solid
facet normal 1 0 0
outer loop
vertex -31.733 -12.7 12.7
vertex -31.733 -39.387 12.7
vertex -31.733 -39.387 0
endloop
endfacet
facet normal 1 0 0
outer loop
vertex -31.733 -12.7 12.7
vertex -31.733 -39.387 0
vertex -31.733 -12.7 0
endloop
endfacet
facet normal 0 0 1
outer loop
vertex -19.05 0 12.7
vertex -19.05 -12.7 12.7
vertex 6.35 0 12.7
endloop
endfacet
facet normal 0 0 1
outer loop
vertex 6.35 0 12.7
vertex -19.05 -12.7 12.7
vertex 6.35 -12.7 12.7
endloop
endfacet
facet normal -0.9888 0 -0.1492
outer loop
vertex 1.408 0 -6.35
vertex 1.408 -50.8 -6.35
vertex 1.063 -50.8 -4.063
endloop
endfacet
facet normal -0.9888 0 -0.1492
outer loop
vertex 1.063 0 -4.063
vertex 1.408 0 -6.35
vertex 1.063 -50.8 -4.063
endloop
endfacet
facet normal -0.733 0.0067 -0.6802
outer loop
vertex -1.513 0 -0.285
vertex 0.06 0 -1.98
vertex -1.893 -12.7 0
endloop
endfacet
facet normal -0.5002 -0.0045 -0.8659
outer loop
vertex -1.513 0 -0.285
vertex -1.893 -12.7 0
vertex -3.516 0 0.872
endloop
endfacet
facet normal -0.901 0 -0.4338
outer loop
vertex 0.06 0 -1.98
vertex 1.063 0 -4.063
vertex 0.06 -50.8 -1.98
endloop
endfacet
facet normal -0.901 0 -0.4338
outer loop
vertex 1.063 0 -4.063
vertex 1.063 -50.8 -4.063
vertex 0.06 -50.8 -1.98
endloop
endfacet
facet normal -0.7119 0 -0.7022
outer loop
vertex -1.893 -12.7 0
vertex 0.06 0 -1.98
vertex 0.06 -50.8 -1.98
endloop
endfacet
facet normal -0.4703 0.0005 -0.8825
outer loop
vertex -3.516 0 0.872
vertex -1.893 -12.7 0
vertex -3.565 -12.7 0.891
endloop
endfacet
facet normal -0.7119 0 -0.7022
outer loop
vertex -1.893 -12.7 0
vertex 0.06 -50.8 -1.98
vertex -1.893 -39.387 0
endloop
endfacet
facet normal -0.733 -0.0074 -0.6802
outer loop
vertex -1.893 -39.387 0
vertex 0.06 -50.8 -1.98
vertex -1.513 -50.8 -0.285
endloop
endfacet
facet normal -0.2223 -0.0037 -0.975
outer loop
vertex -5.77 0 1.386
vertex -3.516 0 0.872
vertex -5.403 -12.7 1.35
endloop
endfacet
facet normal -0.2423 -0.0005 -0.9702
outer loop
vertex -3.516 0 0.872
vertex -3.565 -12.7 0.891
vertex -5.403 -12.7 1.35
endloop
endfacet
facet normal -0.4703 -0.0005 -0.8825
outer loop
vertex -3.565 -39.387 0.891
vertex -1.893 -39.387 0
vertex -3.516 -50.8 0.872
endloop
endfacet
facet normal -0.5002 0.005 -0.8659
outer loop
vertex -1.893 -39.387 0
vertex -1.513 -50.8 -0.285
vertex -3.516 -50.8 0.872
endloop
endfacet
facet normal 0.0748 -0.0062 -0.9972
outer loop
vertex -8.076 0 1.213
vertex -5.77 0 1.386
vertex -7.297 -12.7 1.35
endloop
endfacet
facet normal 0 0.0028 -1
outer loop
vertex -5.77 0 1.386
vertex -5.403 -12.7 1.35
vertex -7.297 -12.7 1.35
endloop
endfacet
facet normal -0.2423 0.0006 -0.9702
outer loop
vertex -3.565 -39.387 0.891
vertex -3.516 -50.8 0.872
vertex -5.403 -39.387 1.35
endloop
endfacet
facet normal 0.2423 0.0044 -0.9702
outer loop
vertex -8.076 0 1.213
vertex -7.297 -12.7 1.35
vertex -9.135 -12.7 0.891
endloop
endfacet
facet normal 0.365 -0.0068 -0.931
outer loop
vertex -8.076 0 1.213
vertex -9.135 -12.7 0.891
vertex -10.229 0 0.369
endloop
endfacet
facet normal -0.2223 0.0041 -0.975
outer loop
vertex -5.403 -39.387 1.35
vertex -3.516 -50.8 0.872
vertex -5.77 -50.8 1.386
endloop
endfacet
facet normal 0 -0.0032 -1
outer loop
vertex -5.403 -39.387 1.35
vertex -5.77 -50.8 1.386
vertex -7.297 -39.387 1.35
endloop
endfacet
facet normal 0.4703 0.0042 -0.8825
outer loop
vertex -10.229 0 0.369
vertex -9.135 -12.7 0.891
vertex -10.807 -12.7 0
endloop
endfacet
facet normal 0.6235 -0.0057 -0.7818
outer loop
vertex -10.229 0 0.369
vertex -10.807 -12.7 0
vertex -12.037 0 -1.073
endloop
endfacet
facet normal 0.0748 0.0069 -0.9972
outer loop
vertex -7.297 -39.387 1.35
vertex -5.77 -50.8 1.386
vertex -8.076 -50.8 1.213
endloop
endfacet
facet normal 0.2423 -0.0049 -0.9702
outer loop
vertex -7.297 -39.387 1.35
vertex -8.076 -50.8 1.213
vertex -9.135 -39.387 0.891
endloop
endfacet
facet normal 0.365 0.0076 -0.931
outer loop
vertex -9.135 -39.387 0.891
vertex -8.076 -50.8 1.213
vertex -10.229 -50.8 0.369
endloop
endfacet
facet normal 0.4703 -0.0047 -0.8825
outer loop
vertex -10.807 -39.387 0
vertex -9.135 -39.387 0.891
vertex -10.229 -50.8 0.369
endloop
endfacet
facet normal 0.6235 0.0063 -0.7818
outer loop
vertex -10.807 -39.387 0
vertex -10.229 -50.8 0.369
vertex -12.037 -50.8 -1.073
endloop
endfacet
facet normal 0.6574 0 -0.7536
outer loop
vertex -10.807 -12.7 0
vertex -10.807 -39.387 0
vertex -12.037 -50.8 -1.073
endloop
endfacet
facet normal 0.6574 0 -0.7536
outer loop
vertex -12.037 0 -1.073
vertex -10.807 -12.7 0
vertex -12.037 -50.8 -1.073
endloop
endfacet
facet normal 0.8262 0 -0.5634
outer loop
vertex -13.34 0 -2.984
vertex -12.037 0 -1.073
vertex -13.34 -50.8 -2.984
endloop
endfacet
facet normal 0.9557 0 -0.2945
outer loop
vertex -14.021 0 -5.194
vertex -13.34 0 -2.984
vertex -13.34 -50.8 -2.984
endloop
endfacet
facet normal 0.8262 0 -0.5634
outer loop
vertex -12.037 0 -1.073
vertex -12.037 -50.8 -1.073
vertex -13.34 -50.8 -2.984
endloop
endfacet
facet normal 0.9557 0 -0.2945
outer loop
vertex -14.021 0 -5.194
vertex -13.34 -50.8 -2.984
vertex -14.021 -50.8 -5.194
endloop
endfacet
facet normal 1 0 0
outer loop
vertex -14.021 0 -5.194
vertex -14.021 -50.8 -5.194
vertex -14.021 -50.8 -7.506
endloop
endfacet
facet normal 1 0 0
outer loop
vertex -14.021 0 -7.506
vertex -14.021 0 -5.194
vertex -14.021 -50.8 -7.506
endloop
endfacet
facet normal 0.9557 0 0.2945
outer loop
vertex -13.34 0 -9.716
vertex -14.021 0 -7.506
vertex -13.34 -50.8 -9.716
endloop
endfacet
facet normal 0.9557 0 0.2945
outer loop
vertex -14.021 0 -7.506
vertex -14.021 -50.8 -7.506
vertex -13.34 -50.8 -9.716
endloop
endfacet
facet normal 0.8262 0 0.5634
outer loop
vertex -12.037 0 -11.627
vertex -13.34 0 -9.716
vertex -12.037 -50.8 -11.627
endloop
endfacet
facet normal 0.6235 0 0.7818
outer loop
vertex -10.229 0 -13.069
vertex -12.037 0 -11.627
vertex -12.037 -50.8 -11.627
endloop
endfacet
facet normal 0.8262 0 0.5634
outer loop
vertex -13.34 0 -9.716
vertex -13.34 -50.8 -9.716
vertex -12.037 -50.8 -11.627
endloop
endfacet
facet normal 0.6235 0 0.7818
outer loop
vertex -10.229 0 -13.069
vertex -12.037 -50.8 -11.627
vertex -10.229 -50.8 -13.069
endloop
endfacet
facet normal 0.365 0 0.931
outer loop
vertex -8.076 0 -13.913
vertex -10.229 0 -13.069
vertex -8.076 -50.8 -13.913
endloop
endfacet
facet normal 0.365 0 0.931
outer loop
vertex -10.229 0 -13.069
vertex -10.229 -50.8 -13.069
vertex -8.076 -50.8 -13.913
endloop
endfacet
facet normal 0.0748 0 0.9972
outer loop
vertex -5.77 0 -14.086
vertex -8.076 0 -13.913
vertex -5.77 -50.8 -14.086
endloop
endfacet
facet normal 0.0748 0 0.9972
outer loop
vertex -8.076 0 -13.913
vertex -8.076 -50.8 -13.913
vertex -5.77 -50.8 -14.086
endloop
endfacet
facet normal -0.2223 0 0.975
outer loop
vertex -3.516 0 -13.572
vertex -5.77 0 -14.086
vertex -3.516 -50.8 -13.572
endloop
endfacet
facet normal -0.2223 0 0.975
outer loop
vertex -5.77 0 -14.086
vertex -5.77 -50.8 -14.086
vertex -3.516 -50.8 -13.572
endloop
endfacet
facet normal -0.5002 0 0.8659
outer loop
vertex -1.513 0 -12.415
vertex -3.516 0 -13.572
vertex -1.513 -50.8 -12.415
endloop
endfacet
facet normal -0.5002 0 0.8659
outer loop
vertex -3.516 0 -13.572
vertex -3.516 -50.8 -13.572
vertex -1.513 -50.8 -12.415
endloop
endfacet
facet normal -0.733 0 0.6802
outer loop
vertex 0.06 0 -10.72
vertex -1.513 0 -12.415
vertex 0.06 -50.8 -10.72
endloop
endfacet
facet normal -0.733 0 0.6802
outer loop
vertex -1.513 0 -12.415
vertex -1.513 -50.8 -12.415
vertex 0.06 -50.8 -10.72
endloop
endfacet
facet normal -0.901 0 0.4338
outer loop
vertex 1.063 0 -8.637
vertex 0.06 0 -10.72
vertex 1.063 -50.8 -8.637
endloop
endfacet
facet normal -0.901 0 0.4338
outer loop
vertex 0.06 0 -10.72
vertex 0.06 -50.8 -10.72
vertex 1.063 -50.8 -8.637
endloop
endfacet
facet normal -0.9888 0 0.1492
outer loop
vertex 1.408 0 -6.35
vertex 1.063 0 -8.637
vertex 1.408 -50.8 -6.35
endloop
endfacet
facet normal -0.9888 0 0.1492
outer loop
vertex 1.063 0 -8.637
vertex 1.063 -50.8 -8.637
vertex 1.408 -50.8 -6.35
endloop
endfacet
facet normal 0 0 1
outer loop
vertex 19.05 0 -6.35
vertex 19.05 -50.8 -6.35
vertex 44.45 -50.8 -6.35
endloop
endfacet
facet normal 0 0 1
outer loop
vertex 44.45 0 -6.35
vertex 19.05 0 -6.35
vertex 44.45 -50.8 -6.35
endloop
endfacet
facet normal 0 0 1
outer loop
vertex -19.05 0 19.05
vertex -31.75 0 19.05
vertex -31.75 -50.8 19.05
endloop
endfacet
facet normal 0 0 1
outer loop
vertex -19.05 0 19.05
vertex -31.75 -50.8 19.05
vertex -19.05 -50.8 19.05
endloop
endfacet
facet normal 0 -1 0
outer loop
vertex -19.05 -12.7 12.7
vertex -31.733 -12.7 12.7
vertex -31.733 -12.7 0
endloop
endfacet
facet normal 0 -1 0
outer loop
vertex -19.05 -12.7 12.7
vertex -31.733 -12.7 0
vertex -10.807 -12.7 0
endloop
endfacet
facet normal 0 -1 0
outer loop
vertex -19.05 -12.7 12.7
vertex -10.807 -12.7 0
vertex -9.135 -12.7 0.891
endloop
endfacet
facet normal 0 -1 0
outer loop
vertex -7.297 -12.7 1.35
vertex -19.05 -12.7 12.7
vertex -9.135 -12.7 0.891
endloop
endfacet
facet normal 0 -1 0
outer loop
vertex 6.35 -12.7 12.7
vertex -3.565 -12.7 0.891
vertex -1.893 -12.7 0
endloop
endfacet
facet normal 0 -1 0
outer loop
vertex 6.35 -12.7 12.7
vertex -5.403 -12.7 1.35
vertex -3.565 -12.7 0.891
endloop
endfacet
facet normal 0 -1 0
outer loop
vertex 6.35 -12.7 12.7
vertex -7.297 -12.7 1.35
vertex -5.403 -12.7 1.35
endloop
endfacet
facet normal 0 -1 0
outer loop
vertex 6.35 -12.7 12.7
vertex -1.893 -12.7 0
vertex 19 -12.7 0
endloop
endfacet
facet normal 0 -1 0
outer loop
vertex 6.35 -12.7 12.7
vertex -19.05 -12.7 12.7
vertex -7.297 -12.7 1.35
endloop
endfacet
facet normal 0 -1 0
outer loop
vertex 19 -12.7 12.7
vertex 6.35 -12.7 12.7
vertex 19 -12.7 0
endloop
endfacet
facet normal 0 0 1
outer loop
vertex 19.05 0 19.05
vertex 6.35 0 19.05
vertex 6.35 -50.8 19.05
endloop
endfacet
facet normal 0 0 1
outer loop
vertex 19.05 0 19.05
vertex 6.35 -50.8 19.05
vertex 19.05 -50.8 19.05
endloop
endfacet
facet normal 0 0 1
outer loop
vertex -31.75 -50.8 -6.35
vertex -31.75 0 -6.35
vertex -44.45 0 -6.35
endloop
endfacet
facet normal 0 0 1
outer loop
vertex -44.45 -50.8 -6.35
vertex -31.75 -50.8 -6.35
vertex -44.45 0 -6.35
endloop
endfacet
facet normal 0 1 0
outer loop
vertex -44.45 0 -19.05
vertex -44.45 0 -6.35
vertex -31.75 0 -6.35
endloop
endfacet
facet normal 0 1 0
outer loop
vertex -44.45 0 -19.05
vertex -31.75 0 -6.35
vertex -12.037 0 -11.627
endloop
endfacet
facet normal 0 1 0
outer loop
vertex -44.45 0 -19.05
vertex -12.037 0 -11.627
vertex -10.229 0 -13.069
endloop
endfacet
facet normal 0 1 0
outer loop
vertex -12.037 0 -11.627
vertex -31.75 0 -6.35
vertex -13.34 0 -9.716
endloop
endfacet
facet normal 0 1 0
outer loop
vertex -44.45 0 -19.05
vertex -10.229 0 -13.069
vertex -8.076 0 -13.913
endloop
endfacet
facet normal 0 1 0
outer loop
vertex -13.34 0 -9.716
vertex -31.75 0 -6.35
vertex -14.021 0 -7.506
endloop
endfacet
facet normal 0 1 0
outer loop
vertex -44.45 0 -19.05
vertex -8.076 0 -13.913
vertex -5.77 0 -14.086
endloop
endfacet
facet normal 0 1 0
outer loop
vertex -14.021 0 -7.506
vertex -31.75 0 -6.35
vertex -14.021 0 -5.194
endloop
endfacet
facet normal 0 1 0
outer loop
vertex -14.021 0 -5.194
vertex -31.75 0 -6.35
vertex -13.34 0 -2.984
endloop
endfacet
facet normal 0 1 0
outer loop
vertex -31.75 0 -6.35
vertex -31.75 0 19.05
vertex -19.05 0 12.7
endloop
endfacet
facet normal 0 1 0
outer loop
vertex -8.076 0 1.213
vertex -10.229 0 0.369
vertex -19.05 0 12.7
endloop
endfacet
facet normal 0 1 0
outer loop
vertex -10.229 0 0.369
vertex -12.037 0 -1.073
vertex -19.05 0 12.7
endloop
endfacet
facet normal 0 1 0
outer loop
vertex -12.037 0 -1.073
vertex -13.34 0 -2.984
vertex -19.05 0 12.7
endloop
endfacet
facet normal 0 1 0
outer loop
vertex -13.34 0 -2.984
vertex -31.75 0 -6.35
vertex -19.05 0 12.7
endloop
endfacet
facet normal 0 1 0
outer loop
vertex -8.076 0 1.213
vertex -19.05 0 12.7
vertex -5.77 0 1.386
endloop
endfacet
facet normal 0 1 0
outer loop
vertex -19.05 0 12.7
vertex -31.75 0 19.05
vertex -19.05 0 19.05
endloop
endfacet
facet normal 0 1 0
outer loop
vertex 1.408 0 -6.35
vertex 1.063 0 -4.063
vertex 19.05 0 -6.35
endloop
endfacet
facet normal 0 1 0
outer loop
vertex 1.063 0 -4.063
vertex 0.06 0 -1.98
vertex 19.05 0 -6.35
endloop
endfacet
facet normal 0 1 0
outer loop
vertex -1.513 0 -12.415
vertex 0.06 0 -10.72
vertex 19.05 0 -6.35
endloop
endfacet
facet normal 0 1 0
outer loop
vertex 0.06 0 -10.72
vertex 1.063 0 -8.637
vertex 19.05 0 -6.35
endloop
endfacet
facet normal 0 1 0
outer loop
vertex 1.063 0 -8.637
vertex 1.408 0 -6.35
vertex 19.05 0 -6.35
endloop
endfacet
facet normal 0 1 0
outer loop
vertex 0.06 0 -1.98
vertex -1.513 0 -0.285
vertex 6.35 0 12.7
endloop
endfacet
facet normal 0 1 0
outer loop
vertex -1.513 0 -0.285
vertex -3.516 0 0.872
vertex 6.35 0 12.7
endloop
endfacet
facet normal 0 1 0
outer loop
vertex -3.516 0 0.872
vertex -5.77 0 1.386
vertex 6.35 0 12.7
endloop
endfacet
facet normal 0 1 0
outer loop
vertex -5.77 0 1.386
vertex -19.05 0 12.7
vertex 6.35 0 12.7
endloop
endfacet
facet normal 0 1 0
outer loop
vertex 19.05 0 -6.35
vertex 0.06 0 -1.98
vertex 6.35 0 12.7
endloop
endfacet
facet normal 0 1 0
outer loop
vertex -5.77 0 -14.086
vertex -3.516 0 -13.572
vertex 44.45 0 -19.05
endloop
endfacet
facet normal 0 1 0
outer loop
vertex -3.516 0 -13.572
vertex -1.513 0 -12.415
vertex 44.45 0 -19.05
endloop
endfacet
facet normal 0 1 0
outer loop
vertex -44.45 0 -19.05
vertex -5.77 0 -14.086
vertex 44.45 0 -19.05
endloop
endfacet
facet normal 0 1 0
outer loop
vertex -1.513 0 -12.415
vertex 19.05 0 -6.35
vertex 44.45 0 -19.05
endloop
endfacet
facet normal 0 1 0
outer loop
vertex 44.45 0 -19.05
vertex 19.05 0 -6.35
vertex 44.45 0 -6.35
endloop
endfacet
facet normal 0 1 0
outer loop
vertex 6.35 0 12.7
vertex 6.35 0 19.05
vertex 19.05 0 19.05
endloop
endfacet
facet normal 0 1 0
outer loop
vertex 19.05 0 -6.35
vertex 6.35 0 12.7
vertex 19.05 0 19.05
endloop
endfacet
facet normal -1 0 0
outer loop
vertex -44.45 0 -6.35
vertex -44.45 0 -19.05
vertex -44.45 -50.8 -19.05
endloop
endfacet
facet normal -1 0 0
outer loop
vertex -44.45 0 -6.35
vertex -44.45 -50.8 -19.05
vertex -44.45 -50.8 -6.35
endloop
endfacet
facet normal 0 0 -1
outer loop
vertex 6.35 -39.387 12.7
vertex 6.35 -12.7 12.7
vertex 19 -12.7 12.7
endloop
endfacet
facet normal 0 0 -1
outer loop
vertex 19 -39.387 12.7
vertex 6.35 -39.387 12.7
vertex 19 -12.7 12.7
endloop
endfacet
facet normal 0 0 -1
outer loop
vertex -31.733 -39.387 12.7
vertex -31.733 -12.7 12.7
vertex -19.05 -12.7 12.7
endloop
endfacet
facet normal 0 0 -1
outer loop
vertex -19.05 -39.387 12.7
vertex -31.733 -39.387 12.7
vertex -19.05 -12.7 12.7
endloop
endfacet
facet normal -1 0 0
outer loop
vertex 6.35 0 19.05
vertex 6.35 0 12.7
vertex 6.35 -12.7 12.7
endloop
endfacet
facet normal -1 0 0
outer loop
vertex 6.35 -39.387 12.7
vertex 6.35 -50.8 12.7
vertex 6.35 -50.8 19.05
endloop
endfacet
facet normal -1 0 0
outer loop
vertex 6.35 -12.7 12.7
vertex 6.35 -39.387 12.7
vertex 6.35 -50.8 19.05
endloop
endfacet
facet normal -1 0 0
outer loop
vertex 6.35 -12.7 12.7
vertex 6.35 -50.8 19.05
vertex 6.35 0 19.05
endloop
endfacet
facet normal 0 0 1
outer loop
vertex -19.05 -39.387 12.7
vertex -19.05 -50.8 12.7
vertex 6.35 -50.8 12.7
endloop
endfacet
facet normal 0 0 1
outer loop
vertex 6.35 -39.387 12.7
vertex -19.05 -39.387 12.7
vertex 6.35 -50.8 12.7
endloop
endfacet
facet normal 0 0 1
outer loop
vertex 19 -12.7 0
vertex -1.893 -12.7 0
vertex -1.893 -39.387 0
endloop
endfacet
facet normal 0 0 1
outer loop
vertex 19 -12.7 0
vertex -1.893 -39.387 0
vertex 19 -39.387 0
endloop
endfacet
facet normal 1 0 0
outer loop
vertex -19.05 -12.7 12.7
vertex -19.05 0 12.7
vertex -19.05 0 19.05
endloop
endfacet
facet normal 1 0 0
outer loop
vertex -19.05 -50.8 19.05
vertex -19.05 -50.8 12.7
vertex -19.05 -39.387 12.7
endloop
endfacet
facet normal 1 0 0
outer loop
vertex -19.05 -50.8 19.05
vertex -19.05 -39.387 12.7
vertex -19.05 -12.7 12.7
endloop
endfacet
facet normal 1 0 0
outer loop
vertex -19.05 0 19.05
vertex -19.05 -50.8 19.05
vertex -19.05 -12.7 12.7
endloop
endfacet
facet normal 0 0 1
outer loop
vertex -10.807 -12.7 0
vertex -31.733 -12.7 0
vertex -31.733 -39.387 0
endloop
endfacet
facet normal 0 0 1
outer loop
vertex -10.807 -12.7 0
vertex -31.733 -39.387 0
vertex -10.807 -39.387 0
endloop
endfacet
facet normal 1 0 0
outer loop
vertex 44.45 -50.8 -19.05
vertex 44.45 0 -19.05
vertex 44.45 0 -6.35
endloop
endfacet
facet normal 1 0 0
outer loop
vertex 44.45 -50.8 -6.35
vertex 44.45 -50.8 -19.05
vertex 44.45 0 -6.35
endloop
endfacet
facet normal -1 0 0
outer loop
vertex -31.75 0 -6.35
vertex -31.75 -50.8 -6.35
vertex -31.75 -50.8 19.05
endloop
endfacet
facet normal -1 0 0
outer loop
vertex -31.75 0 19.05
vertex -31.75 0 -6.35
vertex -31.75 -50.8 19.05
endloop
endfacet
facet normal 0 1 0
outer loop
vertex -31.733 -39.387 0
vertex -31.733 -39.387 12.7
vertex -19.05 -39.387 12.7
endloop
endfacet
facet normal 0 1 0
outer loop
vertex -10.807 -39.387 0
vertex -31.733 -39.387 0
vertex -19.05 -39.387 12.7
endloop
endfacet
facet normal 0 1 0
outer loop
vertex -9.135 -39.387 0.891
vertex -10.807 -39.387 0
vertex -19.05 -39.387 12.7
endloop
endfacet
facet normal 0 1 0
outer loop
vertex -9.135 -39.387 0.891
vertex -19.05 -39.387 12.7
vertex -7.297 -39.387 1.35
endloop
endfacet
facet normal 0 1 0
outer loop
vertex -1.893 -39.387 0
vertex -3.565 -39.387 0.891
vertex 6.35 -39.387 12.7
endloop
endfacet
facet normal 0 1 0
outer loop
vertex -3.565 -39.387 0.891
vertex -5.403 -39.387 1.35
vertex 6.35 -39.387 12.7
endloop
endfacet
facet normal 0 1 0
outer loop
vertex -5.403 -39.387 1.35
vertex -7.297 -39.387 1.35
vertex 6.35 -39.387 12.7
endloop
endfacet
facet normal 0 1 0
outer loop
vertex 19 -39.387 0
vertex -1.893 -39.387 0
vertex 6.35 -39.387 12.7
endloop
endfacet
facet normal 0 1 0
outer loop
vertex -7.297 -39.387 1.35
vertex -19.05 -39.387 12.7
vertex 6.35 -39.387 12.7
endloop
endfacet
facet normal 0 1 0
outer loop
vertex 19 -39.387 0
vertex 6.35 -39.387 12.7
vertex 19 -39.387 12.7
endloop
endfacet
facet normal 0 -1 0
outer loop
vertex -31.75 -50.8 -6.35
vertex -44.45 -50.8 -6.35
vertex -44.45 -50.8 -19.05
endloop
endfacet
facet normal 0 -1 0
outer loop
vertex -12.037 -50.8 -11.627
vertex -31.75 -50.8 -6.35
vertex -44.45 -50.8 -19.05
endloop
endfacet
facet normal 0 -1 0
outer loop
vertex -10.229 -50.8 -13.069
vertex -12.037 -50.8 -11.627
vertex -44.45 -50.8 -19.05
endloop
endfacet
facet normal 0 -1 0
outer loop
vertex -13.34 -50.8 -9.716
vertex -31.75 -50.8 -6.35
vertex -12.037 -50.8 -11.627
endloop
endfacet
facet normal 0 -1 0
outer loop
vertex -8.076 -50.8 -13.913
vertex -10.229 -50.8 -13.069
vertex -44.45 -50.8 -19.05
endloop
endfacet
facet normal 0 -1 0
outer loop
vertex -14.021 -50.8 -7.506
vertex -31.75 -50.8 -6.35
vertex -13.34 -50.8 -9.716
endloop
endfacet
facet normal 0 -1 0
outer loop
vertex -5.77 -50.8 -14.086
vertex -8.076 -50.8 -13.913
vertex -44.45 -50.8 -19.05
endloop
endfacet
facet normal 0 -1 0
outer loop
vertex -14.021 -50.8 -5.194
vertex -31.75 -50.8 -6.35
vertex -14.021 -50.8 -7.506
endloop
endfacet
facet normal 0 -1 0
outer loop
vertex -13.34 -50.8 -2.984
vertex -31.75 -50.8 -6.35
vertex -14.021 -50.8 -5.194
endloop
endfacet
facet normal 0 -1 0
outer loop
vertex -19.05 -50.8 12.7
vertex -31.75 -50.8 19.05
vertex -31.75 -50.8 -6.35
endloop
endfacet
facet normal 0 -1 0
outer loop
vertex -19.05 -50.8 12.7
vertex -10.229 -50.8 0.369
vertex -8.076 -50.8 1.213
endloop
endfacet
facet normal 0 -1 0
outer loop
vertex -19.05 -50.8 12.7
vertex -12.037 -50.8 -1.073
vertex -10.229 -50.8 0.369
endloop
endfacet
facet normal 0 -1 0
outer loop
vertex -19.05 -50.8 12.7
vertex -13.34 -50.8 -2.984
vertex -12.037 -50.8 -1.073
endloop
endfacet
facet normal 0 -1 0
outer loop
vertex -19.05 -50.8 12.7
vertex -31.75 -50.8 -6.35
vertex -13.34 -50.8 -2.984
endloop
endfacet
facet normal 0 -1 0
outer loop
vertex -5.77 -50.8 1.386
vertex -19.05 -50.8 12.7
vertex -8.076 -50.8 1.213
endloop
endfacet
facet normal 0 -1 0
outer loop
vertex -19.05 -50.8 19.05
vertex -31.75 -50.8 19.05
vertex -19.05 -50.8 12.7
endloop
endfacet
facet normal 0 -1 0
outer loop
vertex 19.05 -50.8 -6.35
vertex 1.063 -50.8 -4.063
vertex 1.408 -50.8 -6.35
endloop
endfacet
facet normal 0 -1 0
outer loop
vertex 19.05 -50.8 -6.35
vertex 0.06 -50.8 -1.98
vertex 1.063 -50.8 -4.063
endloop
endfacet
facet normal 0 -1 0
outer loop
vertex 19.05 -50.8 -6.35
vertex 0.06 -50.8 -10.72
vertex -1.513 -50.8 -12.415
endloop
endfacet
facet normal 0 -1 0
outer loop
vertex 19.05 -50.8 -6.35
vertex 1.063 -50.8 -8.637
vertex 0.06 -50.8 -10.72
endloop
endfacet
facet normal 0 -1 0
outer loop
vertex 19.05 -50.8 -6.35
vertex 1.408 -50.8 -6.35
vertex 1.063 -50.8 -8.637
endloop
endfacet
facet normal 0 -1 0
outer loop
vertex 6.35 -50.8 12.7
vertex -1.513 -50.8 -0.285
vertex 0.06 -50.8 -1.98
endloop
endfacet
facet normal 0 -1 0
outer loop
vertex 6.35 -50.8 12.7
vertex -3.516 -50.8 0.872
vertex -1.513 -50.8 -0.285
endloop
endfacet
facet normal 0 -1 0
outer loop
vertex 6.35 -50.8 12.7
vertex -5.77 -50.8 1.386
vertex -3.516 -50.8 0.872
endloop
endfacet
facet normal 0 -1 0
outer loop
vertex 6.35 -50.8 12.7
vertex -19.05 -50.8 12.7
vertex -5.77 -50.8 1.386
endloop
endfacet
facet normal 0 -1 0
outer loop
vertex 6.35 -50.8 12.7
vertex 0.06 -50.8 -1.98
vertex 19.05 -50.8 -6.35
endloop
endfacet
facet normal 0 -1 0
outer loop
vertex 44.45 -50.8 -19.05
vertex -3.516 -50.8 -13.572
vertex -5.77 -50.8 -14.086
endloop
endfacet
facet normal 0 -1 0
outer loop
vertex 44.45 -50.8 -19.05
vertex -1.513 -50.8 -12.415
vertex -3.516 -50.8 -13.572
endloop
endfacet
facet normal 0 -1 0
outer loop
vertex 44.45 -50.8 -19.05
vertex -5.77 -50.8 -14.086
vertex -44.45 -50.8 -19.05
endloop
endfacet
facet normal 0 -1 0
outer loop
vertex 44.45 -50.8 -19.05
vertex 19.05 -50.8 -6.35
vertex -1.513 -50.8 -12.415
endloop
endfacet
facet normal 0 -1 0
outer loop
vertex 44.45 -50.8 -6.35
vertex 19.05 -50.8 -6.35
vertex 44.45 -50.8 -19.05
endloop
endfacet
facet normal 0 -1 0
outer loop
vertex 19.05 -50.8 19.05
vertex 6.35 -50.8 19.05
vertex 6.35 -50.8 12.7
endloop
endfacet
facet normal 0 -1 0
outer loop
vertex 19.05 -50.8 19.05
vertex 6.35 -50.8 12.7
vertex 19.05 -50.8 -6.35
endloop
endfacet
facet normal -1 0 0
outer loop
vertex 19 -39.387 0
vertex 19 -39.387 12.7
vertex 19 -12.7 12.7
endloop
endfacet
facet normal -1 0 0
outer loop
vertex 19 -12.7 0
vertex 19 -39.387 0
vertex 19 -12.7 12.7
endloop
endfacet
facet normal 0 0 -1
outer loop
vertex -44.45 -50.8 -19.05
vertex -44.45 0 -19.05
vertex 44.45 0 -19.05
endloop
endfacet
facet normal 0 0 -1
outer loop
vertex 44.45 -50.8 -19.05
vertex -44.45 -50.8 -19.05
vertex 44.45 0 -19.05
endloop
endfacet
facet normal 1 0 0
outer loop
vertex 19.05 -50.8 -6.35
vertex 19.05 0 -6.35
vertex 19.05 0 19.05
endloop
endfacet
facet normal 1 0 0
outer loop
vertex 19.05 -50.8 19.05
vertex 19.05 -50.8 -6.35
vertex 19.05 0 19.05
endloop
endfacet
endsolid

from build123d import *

# Parameters (mm, degrees)
F0_W      = 88.9
F0_H      = 38.1
F1_DEPTH  = 50.8
F2_W      = 25.4
F2_H      = 25.4
F3_DEPTH  = 50.801
F4_W      = 12.7
F4_H      = 25.4
F5_DEPTH  = 50.801
F6_W      = 25.4
F6_H      = 6.35
F7_DEPTH  = 50.801
F9_W      = 50.733156
F9_H      = 26.686712
F10_DEPTH = 12.7
F8_R      = 7.757908
F11_DEPTH = 50.801


with BuildPart() as f1:
    # F0 (on Front) → F1 (new body)
    with BuildSketch(Plane.XZ):
        Rectangle(F0_W, F0_H)
    extrude(amount=F1_DEPTH)

    # F2 (on face) → F3 (cut, through all)
    with BuildSketch(Plane.XZ.offset(50.8)):
        with Locations((31.75, 6.35)):
            Rectangle(F2_W, F2_H)
    extrude(amount=-F3_DEPTH, mode=Mode.SUBTRACT)

    # F4 (on face) → F5 (cut, through all)
    with BuildSketch(Plane(origin=(0, 0, 0), x_dir=(-1, 0, 0), z_dir=(0, 1, 0))):
        with Locations((38.1, 6.35)):
            Rectangle(F4_W, F4_H)
    extrude(amount=-F5_DEPTH, mode=Mode.SUBTRACT)

    # F6 (on face) → F7 (cut, through all)
    with BuildSketch(Plane.XZ.offset(50.8)):
        with Locations((-6.35, 15.875)):
            Rectangle(F6_W, F6_H)
    extrude(amount=-F7_DEPTH, mode=Mode.SUBTRACT)

    # F9 (on face) → F10 (cut)
    with BuildSketch(Plane.XY.offset(12.7)):
        with Locations((-6.366711, -26.043356)):
            Rectangle(F9_W, F9_H)
    extrude(amount=-F10_DEPTH, mode=Mode.SUBTRACT)

    # F8 (on face) → F11 (cut, through all)
    with BuildSketch(Plane.XZ.offset(50.8)):
        with Locations((-6.35, -6.35)):
            Circle(F8_R)
    extrude(amount=-F11_DEPTH, mode=Mode.SUBTRACT)


solid = f1.part
